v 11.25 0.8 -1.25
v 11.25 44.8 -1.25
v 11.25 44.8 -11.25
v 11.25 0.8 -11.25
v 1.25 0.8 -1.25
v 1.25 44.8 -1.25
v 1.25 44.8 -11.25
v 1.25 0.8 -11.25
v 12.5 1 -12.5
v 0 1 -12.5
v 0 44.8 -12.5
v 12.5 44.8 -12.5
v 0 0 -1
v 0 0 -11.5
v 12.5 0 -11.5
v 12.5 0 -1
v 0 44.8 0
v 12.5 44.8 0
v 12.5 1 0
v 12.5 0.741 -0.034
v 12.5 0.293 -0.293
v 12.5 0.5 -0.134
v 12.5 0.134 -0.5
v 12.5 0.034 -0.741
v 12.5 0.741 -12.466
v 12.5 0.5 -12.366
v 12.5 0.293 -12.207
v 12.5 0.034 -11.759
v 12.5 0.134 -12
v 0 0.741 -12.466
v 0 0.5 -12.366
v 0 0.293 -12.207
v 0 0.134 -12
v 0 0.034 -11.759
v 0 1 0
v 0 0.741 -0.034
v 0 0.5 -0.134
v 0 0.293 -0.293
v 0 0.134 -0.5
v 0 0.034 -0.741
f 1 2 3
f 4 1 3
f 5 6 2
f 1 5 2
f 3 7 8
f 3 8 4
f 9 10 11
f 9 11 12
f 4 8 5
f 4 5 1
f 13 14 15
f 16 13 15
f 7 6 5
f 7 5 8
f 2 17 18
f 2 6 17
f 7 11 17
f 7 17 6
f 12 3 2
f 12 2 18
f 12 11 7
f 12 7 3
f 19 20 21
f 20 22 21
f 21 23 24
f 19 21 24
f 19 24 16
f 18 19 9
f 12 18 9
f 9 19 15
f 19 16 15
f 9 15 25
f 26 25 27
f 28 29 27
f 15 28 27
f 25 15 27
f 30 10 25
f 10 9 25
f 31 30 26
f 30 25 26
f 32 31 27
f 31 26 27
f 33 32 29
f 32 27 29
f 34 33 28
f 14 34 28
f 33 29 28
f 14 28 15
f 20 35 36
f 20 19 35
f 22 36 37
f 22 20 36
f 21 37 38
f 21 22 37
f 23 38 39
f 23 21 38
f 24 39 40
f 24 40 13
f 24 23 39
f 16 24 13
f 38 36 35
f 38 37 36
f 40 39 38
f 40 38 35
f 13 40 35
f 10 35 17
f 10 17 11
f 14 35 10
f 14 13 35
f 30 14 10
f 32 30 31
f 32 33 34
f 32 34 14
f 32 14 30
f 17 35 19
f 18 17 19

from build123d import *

# Parameters (mm, degrees)
SKETCH_1_W          = 12.5
SKETCH_1_H          = 12.5
EXTRUDE_1_DEPTH     = 44.8
SKETCH_2_W          = 10
SKETCH_2_H          = 10
CUT_EXTRUDE_1_DEPTH = 44
FILLET_1_R          = 1


with BuildPart() as part:
    # Эскиз1 → Бобышка-Вытянуть1 (new body)
    with BuildSketch(Plane(origin=(0, 0, 0), x_dir=(1, 0, 0), z_dir=(0, 1, 0))):
        with Locations((6.25, 6.25)):
            Rectangle(SKETCH_1_W, SKETCH_1_H)
    extrude(amount=EXTRUDE_1_DEPTH)

    # Эскиз2 → Вырез-Вытянуть1 (cut)
    with BuildSketch(Plane(origin=(0, 44.8, 0), x_dir=(1, 0, 0), z_dir=(0, 1, 0))):
        with Locations((6.25, 6.25)):
            Rectangle(SKETCH_2_W, SKETCH_2_H)
    extrude(amount=-CUT_EXTRUDE_1_DEPTH, mode=Mode.SUBTRACT)

    # Скругление1
    fillet_1_edges = [part.edges().sort_by_distance(p)[0] for p in [
        (6.25, 0, -12.5),
        (6.25, 0, 0),
    ]]
    fillet(fillet_1_edges, radius=FILLET_1_R)


solid = part.part
